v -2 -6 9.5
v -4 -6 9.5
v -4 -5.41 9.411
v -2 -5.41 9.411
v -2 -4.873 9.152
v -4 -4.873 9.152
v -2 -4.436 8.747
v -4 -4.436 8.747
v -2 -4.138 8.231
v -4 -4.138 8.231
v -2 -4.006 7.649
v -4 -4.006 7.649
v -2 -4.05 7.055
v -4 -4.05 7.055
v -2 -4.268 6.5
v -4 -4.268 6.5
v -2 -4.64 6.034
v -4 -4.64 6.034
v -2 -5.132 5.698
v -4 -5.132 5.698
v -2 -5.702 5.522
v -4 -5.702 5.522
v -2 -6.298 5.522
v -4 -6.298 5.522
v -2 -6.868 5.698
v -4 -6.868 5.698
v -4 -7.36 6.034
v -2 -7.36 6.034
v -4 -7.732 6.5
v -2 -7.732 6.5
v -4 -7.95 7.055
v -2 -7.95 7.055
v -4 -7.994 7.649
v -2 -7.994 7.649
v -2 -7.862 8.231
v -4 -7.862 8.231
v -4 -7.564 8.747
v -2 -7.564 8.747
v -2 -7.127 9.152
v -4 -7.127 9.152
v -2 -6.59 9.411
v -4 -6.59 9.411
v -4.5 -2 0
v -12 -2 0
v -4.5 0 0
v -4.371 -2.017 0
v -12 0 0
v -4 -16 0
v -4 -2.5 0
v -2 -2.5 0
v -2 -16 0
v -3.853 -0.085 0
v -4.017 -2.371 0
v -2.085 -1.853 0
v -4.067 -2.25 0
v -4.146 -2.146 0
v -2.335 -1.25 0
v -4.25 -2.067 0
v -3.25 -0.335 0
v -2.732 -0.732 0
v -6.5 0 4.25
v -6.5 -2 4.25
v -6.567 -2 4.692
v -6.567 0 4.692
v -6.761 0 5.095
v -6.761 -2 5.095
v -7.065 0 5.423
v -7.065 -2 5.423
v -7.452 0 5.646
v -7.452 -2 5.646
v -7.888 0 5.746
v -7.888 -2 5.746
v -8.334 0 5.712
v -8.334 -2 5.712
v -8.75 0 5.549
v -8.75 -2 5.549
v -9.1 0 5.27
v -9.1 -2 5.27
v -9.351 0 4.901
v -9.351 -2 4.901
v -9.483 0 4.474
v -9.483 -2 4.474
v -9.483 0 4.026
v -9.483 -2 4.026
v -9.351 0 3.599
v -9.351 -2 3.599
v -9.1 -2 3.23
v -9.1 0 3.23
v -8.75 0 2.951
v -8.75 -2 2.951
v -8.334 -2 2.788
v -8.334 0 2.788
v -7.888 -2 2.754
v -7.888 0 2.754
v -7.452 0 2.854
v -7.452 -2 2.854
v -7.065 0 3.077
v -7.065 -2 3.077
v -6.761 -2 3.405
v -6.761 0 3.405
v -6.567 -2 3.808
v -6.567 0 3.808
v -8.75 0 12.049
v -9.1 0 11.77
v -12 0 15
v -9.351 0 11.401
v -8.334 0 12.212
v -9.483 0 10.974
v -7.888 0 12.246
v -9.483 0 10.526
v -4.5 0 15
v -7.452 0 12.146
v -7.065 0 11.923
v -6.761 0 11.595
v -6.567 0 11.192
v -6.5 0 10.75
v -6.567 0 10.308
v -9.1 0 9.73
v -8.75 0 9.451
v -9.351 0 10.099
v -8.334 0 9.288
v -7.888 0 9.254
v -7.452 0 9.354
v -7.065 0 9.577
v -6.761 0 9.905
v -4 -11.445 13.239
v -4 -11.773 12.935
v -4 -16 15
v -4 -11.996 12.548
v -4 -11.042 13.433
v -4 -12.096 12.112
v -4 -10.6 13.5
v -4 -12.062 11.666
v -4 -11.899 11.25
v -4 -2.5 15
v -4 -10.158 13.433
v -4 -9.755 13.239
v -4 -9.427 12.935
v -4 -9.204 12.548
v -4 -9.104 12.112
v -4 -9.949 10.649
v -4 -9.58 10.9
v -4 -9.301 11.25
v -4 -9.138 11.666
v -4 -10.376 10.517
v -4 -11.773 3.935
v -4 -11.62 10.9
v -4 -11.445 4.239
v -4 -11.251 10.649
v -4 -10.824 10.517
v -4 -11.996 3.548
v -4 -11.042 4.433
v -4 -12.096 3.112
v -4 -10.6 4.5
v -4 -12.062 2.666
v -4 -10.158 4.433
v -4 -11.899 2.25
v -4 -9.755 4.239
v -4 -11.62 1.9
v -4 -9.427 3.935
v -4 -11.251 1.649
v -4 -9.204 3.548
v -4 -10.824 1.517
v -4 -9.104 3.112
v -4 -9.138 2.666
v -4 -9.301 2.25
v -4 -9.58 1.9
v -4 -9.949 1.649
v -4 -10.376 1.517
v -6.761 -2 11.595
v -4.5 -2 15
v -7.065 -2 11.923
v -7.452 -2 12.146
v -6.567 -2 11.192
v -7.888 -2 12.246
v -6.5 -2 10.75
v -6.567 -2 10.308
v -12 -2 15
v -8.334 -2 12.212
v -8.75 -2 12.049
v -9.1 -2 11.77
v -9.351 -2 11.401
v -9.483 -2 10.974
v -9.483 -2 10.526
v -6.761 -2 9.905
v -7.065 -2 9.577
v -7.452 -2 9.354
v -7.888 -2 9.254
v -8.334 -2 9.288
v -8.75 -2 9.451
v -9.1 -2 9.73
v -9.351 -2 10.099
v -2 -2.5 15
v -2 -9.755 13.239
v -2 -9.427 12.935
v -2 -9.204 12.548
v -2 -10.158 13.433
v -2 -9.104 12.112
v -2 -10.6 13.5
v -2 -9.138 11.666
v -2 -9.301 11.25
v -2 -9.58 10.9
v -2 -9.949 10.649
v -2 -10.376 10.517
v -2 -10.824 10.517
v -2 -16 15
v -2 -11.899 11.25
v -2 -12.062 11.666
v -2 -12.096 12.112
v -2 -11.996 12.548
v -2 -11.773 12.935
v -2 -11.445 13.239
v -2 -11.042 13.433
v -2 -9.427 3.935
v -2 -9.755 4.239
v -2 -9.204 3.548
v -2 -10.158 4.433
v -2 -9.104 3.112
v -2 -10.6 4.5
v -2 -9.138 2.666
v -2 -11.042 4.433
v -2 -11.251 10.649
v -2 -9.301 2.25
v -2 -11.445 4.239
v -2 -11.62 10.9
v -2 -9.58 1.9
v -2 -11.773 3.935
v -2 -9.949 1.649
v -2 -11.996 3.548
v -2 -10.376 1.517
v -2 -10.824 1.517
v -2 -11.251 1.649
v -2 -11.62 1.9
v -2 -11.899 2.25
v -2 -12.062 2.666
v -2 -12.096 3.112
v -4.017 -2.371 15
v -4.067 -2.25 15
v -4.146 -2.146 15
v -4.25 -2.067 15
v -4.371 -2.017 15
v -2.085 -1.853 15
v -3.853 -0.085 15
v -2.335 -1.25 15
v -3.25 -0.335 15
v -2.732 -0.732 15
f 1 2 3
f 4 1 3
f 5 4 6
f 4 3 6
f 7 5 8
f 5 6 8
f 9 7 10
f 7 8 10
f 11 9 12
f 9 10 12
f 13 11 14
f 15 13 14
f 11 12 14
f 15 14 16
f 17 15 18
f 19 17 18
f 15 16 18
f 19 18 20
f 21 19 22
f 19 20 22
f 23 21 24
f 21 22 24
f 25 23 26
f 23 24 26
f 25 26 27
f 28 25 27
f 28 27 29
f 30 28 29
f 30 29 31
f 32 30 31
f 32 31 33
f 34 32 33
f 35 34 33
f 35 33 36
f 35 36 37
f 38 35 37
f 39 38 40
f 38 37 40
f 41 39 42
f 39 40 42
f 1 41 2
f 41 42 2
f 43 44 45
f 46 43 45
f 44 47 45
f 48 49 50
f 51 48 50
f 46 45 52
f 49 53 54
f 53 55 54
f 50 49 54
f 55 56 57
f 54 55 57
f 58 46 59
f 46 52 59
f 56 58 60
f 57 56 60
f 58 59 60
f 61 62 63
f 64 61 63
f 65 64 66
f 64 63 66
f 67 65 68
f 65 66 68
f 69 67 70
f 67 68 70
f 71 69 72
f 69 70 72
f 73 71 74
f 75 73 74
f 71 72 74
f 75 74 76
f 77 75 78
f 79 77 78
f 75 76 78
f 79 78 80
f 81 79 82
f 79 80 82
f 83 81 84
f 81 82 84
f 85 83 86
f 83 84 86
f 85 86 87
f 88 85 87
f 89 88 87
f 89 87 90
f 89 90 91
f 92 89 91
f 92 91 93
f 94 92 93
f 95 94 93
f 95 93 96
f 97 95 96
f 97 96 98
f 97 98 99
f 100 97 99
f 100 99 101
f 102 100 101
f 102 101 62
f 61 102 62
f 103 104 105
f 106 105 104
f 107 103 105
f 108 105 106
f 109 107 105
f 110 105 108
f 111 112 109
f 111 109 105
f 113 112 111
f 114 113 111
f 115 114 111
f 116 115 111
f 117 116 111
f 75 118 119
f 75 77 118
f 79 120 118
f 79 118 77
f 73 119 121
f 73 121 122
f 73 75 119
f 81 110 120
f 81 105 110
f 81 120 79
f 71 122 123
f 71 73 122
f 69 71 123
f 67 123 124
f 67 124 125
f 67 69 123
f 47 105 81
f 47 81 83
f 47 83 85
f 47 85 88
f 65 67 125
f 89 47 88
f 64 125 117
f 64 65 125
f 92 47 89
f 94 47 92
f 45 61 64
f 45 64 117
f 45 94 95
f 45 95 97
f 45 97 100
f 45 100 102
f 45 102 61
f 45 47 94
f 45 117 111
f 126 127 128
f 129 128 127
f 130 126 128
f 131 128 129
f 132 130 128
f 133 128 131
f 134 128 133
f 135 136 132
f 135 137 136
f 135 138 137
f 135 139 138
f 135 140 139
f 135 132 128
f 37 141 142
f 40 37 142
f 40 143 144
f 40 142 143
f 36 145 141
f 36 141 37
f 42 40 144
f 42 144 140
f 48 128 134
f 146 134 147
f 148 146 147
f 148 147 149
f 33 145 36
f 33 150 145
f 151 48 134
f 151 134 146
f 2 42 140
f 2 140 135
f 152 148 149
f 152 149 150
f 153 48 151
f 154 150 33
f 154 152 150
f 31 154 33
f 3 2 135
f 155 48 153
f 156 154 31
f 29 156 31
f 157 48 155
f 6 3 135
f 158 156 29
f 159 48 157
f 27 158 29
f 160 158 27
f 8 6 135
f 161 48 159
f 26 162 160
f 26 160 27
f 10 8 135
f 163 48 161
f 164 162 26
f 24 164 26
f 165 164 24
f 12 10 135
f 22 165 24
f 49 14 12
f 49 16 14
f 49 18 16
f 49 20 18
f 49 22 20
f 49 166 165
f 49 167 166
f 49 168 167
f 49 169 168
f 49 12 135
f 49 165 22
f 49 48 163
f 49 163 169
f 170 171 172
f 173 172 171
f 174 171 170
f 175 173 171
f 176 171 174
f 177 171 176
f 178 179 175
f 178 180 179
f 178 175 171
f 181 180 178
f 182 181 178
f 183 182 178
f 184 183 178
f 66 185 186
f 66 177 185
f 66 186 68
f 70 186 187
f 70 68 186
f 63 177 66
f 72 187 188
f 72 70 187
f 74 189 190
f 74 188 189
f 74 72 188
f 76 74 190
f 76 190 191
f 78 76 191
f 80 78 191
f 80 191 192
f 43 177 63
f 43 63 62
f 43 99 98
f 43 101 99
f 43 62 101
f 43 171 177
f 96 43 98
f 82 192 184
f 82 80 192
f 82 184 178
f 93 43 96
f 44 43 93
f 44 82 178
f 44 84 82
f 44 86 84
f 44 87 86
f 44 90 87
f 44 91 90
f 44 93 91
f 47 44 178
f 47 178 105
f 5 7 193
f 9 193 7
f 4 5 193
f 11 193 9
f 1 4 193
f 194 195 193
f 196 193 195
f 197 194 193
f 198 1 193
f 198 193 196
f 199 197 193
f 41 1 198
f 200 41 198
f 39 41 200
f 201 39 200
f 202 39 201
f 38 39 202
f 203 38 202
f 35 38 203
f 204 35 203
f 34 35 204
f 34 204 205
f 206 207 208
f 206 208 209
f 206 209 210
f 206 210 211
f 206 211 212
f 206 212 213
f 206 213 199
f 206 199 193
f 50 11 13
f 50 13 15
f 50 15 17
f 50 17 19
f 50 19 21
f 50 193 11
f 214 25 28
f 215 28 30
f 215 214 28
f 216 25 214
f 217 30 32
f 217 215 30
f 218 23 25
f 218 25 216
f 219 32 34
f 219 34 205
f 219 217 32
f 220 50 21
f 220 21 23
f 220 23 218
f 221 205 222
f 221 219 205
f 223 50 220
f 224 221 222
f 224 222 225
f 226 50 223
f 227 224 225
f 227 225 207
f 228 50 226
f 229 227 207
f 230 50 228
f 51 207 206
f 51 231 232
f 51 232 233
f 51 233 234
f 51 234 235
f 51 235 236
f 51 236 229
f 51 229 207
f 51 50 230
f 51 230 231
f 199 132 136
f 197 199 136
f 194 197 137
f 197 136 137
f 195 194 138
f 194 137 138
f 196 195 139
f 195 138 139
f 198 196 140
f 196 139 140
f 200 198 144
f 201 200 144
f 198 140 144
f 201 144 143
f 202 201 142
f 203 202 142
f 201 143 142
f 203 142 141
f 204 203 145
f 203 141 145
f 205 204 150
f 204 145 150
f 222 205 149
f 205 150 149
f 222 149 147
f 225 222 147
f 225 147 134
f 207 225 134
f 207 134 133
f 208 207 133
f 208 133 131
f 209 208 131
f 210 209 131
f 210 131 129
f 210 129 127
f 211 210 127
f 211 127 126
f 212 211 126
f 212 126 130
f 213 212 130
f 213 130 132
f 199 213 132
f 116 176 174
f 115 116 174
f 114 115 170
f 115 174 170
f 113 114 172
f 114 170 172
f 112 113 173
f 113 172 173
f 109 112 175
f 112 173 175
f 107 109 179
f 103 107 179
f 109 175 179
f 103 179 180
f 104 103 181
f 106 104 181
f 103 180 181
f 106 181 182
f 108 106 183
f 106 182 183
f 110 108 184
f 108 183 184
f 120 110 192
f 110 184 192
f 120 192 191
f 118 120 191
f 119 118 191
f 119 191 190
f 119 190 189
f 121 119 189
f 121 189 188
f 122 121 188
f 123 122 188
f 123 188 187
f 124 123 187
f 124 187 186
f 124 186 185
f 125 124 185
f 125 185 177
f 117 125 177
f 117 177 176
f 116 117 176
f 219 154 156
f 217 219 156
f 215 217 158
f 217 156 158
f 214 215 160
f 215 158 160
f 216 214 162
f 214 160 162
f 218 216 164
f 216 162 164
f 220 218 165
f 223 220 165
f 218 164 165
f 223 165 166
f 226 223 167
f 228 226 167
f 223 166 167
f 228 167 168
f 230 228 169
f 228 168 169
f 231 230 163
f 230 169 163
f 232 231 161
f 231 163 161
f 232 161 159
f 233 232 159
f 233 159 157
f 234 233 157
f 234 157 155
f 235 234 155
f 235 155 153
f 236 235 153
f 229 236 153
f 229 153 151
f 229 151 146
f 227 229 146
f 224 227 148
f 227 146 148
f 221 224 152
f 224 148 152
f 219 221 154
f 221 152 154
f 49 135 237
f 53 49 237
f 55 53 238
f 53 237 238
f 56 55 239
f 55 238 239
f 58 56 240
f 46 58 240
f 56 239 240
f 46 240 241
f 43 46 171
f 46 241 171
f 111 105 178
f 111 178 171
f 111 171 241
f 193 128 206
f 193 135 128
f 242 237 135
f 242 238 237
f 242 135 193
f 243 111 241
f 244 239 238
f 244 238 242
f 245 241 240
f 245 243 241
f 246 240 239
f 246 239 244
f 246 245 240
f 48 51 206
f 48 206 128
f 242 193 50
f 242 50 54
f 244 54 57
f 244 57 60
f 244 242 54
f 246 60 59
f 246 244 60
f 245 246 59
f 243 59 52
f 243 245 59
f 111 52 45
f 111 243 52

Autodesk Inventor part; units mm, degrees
ref_plane "YZ Plane" through (0, 0, 0) normal (1, 0, 0) x (0, 1, 0)
ref_plane "XZ Plane" through (0, 0, 0) normal (0, 1, 0) x (-1, 0, 0)
ref_plane "XY Plane" through (0, 0, 0) normal (0, 0, 1) x (1, 0, 0)
sketch "Sketch1" plane through (0, 0, 0) normal (0, 0, 1) x (1, 0, 0)
  line L0 (-2, 0) -> (-2, -16)
  line L1 (-2, -16) -> (-4, -16)
  line L2 (-4, -16) -> (-4, -2)
  line L3 (-4, -2) -> (-12, -2)
  line L4 (-12, -2) -> (-12, 0)
  line L5 (-12, 0) -> (-2, 0)
  line L6 (-12, 0) -> (-2, 0)
  dimension "d38" = 2
  dimension "d39" = 14
  dimension "d40" = 8
  dimension "d41" = 2
extrude "Extrusion3" add sketch "Sketch1" along normal blind 15
sketch "Sketch2" plane through (-12, -2, 0) normal (0, -1, 0) x (1, 0, 0)
  circle A0 centre (4, 4.25) radius 1.5
  line L0 (0, 15) -> (8, 15) projected
  line L1 (0, 0) -> (0, 15) projected
  line L2 (0, 0) -> (8, 0) projected
  circle A1 centre (4, 10.75) radius 1.5
  dimension "d45" = 3
  dimension "d47" = 4
  dimension "d48" = 4.25
  dimension "d49" = 3
  dimension "d50" = 4
  dimension "d51" = 4.25
extrude "Extrusion4" cut sketch "Sketch2" against normal blind 10
sketch "Sketch3" plane through (-4, -16, 0) normal (-1, 0, 0) x (0, 0, 1)
  circle A0 centre (12, 5.4) radius 1.5
  circle A1 centre (3, 5.4) radius 1.5
  line L0 (0, 0) -> (15, 0) projected
  line L1 (15, 14) -> (15, 0) projected
  line L2 (0, 14) -> (0, 0) projected
  circle A2 centre (7.5, 10) radius 2
  dimension "d55" = 3
  dimension "d56" = 5.4
  dimension "d57" = 5.4
  dimension "d58" = 3
  dimension "d59" = 3
  dimension "d62" = 4
  dimension "d65" = 10
  dimension "d68" = 3
extrude "Extrusion5" cut sketch "Sketch3" against normal blind 10 contours A0 | A1
extrude "Extrusion6" cut sketch "Sketch3" against normal blind 10 contours A2
fillet "Fillet1" radius 2.5 1 edges at (-2, 0, 7.5)
fillet "Fillet2" radius 0.5 1 edges at (-4, -2, 7.5)
equation "\"d48\" = d51"
properties part number "Soporte de Final de Carrera - Eje Y" material "Aluminum 1100-H14"
